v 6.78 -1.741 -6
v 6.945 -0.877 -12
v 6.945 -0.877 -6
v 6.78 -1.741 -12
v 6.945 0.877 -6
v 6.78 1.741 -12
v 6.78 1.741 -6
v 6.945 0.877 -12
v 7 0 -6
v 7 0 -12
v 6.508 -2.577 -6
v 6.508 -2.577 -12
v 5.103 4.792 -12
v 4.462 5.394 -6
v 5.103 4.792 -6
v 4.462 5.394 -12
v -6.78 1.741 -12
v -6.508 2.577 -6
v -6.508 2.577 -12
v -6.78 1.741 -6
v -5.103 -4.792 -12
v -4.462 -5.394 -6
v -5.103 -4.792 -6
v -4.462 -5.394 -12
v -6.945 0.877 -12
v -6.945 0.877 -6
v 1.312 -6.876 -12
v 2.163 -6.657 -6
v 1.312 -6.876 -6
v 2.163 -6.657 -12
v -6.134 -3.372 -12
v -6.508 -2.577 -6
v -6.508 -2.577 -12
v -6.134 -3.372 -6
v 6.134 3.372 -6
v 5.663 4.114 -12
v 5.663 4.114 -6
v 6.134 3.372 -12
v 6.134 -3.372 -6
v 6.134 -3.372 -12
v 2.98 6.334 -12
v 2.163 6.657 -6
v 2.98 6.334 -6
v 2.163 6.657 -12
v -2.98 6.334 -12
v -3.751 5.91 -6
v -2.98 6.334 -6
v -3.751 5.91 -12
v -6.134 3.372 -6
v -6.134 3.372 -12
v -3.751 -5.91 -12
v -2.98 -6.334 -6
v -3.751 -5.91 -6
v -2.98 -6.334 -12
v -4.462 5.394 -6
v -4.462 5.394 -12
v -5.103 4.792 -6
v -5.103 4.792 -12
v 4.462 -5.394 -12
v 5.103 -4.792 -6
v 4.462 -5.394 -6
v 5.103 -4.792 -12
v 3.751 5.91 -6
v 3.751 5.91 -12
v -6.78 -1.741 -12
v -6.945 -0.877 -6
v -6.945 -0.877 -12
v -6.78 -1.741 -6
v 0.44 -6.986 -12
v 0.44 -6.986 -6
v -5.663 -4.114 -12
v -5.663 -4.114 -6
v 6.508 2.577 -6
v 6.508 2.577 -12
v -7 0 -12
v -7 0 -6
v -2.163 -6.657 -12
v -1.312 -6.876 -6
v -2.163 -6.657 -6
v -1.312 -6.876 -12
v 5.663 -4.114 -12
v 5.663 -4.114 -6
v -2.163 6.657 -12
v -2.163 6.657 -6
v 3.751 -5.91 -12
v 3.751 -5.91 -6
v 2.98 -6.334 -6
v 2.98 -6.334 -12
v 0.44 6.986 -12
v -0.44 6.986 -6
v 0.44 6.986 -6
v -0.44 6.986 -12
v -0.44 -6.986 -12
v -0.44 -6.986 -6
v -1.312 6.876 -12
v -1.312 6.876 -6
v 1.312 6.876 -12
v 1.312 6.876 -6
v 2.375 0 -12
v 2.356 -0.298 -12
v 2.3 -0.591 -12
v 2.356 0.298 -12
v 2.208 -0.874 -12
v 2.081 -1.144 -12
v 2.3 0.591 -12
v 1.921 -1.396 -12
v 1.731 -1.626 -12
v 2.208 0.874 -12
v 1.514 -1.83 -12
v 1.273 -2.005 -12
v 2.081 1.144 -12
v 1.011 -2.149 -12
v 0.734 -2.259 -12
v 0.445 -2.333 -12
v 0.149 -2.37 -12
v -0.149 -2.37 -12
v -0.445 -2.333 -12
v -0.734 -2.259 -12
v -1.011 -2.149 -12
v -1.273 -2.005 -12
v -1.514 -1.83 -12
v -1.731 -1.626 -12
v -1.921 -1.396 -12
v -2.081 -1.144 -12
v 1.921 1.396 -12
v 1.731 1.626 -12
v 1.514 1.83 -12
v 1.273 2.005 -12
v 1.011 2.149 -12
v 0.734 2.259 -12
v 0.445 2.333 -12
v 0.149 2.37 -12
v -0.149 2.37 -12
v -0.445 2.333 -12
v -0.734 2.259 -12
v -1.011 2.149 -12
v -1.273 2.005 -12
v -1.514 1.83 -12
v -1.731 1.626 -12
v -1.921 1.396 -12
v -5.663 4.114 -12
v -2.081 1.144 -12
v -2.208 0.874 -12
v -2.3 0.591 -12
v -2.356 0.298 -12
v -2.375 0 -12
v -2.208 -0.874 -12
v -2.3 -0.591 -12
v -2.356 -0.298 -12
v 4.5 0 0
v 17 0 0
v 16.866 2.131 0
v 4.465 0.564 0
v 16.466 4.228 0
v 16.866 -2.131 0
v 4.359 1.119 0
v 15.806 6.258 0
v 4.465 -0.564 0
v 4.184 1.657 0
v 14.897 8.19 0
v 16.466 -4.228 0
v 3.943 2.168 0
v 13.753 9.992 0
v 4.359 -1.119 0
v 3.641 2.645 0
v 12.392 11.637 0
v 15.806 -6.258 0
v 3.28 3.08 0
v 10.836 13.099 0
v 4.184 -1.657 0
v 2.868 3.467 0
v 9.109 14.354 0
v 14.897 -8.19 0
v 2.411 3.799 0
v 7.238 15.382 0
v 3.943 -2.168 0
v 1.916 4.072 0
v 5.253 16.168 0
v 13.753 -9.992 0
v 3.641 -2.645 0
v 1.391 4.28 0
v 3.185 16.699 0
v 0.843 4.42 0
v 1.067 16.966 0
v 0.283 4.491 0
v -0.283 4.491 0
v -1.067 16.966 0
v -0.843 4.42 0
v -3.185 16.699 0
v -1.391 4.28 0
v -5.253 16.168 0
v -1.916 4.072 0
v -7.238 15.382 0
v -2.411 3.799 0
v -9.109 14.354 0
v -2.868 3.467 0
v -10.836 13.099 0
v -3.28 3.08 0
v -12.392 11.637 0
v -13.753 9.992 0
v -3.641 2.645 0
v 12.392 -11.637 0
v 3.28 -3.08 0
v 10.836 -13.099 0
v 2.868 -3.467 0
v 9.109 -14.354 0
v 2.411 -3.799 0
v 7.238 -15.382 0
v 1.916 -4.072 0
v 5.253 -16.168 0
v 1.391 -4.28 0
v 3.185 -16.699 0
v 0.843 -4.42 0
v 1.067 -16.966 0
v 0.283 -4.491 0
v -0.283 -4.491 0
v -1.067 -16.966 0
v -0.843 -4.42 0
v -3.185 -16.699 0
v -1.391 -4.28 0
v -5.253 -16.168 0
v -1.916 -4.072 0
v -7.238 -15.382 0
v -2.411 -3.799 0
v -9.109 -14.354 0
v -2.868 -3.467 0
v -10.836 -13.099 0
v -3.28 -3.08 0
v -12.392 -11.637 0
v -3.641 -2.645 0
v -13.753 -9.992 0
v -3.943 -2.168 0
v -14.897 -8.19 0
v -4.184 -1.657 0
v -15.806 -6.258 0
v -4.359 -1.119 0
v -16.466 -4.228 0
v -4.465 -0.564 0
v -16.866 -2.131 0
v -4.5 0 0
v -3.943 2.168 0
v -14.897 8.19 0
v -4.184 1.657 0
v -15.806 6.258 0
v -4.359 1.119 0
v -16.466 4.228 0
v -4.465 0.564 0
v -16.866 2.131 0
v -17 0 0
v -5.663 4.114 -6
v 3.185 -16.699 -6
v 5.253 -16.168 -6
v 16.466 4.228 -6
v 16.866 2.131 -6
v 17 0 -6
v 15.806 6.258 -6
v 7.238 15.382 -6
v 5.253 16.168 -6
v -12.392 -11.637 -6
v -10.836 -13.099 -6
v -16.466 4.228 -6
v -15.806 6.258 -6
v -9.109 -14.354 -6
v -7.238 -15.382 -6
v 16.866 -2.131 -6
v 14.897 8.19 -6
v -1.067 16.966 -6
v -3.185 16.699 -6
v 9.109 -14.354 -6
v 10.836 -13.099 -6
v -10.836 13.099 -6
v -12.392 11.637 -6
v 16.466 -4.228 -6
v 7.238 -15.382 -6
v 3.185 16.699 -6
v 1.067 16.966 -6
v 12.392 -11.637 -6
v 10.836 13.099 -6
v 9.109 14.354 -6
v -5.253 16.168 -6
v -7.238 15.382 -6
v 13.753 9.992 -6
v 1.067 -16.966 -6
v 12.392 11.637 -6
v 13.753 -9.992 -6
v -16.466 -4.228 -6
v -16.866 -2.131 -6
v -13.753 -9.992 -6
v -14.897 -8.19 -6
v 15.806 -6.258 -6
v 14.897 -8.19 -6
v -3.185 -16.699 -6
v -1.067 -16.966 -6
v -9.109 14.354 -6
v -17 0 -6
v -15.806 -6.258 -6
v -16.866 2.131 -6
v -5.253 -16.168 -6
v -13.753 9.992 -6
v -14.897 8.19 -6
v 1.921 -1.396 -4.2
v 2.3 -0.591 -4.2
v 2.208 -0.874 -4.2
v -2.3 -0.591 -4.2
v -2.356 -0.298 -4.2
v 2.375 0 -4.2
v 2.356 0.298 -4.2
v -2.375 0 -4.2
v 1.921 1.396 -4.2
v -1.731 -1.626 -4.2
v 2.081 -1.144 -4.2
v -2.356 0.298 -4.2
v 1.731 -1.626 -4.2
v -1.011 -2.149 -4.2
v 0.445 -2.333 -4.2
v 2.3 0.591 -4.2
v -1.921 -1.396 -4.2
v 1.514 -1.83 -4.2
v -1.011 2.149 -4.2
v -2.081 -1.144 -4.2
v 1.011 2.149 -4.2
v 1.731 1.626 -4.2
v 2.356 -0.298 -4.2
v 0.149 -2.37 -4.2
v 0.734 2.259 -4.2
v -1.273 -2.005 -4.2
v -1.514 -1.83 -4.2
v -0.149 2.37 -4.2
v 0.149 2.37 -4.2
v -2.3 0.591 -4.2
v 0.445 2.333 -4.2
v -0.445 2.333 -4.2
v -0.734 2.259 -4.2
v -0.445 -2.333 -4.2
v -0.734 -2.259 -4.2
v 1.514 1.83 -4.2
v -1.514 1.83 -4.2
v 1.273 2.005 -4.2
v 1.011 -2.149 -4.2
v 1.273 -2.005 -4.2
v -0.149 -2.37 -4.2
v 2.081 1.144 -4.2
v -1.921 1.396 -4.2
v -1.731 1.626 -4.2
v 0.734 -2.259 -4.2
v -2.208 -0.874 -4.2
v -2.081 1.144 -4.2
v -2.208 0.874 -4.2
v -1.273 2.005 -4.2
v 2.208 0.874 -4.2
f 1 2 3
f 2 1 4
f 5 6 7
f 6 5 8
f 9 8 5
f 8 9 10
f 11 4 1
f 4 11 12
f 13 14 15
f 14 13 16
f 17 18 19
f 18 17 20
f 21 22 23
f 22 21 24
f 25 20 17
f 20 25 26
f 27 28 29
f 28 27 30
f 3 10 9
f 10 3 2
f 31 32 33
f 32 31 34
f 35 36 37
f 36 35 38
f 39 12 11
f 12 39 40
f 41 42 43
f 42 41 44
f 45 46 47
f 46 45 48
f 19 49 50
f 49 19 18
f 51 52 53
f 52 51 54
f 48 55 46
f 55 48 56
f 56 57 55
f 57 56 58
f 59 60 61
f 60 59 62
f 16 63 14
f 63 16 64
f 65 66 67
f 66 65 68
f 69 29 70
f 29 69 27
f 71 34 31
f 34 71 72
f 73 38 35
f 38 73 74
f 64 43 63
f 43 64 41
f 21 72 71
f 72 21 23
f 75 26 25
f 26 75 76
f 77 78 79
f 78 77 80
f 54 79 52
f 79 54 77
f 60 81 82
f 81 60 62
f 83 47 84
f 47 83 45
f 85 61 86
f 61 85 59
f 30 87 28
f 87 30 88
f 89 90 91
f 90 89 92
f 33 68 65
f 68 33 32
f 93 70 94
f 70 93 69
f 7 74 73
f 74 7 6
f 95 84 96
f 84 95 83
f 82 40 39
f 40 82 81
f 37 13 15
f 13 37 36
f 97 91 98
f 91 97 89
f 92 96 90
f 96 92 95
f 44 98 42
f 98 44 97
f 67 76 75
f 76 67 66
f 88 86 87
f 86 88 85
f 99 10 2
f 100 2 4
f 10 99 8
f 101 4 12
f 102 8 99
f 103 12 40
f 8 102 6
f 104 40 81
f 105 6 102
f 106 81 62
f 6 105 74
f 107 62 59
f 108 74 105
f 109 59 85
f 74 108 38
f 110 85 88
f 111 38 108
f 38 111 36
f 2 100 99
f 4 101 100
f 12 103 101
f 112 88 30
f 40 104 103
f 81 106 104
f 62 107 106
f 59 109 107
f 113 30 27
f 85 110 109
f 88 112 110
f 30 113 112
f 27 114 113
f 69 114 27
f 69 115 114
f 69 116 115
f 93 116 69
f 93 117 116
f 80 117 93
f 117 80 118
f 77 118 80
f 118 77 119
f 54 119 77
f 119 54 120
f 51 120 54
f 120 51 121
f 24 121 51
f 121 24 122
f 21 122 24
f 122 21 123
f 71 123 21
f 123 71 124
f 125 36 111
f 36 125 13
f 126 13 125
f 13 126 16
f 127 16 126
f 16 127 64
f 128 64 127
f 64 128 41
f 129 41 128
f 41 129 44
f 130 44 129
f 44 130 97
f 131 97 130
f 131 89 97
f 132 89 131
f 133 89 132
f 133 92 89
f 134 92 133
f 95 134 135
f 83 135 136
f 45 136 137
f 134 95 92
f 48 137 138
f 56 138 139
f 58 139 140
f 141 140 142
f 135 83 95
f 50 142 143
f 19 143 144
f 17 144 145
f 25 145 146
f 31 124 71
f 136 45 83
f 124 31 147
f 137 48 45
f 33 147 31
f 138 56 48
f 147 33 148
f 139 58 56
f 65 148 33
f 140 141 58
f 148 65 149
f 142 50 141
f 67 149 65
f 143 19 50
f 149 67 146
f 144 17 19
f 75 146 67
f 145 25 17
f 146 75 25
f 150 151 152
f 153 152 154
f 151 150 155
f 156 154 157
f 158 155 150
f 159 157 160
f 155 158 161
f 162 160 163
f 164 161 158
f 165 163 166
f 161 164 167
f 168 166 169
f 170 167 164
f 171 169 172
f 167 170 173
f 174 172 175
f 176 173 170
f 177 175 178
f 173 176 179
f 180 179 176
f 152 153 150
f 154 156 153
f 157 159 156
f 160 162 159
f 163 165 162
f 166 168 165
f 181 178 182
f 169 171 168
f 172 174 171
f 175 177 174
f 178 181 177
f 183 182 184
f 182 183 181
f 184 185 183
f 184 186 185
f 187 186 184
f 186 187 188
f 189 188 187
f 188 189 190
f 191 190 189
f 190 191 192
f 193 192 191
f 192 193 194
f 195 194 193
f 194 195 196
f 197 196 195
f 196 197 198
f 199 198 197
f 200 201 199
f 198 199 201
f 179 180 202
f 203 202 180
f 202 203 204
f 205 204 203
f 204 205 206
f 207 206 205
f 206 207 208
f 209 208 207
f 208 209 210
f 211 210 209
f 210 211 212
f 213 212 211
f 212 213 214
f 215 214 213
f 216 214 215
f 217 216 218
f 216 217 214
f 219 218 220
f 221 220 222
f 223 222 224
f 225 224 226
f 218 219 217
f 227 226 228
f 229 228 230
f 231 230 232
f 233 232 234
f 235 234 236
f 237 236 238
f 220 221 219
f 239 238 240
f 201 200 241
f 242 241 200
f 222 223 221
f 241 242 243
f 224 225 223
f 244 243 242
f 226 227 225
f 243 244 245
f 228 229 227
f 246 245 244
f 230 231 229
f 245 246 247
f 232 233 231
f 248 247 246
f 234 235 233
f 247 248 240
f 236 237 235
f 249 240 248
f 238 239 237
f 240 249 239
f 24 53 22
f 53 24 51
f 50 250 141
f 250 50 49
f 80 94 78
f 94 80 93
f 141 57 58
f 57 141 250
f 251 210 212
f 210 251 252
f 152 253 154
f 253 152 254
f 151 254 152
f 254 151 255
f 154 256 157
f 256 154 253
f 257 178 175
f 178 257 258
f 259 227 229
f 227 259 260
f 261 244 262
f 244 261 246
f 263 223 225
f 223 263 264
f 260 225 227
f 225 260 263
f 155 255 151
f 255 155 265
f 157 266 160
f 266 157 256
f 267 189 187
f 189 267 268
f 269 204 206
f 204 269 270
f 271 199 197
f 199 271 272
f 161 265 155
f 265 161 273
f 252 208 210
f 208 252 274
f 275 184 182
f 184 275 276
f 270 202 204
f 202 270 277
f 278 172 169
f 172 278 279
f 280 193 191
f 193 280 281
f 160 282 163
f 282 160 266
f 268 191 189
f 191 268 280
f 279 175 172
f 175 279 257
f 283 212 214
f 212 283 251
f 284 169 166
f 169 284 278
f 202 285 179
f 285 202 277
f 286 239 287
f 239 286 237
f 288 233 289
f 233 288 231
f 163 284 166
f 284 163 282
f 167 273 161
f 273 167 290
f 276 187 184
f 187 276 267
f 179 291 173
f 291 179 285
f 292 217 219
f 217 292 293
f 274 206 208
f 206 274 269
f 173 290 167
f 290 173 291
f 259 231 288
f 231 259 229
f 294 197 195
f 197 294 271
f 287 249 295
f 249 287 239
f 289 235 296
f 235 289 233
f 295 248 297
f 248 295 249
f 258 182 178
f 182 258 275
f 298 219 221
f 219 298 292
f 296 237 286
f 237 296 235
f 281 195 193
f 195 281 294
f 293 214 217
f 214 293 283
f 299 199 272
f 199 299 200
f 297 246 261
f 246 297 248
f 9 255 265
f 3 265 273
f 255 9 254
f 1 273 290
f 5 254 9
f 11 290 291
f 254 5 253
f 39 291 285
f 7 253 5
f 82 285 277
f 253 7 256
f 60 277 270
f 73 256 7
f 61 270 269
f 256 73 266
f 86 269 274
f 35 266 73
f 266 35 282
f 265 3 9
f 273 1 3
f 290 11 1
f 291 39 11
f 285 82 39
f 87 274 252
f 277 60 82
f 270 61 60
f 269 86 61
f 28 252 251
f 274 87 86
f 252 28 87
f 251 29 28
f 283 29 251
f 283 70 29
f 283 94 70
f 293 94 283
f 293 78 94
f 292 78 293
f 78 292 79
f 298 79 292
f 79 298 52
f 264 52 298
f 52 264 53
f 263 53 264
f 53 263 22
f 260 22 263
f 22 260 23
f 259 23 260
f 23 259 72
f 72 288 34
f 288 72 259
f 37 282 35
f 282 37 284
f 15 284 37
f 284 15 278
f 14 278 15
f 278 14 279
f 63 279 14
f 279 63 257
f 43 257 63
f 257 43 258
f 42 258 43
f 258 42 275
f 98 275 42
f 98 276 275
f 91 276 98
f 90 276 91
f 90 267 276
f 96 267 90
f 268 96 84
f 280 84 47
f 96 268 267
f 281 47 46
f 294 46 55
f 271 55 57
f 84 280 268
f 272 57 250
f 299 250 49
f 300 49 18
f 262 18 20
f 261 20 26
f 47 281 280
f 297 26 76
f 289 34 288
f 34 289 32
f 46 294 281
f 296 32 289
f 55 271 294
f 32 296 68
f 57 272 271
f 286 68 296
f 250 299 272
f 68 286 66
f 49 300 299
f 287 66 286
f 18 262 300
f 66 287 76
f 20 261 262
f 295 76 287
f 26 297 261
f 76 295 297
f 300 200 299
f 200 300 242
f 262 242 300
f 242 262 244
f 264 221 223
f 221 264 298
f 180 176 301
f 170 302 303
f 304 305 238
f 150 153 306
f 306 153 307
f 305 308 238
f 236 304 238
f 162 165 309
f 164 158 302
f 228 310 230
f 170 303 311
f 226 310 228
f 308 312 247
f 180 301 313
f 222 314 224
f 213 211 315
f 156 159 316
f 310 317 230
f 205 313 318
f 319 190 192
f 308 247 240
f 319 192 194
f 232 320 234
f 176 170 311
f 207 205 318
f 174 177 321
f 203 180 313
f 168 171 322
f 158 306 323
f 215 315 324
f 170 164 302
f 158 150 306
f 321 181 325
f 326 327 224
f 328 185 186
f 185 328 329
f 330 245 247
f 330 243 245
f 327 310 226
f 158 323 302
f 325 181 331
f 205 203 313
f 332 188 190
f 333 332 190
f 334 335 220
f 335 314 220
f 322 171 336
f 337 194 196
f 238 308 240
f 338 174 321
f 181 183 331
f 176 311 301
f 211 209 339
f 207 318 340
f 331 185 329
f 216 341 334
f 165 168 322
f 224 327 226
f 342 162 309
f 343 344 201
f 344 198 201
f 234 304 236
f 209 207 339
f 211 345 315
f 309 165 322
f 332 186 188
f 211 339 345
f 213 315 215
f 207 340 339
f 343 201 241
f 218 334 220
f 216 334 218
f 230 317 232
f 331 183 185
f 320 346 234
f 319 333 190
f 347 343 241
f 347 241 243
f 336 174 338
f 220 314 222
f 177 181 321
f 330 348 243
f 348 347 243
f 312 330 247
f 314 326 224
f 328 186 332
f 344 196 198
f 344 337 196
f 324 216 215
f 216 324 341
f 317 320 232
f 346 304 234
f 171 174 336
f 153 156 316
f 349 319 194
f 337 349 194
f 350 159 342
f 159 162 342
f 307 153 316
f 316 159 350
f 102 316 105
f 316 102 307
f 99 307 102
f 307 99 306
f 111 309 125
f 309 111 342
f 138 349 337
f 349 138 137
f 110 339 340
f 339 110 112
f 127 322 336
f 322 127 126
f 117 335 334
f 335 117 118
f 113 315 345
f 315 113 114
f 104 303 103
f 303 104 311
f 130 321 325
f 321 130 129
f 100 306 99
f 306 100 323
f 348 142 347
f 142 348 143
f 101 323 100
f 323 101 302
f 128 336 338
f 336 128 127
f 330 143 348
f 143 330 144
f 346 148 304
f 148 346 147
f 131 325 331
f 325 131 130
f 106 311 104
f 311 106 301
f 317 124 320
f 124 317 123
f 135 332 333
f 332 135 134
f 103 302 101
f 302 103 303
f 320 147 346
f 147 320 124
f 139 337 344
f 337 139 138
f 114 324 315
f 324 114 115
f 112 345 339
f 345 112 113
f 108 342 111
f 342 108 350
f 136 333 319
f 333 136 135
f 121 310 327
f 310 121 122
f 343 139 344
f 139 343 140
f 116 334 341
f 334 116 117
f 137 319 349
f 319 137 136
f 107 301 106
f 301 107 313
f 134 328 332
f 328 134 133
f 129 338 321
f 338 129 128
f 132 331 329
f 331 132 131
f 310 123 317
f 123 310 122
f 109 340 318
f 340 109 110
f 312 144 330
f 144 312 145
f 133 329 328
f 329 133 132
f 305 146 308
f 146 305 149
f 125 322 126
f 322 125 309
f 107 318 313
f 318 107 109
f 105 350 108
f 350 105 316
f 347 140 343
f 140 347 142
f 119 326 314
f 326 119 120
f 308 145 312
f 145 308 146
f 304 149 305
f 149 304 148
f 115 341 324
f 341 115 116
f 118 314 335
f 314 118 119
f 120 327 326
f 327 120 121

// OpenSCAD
$fn = 50;


difference() {
	union() {
		translate(v = [0, 0, -12.0000000000]) {
			cylinder(h = 12, r = 7.0000000000);
		}
		translate(v = [0, 0, -6.0000000000]) {
			cylinder(h = 6, r = 17.0000000000);
		}
	}
	union() {
		translate(v = [0, 0, 0]) {
			rotate(a = [0, 0, 0]) {
				difference() {
					union() {
						#translate(v = [0, 0, -12.0000000000]) {
							cylinder(h = 12, r = 2.2500000000);
						}
						#translate(v = [0, 0, -4.2000000000]) {
							cylinder(h = 4.2000000000, r = 7.0000000000, r1 = 2.3750000000, r2 = 4.5000000000);
						}
						#translate(v = [0, 0, -12.0000000000]) {
							cylinder(h = 12, r = 2.3750000000);
						}
						#translate(v = [0, 0, -12.0000000000]) {
							cylinder(h = 12, r = 2.2500000000);
						}
					}
					union();
				}
			}
		}
	}
}
